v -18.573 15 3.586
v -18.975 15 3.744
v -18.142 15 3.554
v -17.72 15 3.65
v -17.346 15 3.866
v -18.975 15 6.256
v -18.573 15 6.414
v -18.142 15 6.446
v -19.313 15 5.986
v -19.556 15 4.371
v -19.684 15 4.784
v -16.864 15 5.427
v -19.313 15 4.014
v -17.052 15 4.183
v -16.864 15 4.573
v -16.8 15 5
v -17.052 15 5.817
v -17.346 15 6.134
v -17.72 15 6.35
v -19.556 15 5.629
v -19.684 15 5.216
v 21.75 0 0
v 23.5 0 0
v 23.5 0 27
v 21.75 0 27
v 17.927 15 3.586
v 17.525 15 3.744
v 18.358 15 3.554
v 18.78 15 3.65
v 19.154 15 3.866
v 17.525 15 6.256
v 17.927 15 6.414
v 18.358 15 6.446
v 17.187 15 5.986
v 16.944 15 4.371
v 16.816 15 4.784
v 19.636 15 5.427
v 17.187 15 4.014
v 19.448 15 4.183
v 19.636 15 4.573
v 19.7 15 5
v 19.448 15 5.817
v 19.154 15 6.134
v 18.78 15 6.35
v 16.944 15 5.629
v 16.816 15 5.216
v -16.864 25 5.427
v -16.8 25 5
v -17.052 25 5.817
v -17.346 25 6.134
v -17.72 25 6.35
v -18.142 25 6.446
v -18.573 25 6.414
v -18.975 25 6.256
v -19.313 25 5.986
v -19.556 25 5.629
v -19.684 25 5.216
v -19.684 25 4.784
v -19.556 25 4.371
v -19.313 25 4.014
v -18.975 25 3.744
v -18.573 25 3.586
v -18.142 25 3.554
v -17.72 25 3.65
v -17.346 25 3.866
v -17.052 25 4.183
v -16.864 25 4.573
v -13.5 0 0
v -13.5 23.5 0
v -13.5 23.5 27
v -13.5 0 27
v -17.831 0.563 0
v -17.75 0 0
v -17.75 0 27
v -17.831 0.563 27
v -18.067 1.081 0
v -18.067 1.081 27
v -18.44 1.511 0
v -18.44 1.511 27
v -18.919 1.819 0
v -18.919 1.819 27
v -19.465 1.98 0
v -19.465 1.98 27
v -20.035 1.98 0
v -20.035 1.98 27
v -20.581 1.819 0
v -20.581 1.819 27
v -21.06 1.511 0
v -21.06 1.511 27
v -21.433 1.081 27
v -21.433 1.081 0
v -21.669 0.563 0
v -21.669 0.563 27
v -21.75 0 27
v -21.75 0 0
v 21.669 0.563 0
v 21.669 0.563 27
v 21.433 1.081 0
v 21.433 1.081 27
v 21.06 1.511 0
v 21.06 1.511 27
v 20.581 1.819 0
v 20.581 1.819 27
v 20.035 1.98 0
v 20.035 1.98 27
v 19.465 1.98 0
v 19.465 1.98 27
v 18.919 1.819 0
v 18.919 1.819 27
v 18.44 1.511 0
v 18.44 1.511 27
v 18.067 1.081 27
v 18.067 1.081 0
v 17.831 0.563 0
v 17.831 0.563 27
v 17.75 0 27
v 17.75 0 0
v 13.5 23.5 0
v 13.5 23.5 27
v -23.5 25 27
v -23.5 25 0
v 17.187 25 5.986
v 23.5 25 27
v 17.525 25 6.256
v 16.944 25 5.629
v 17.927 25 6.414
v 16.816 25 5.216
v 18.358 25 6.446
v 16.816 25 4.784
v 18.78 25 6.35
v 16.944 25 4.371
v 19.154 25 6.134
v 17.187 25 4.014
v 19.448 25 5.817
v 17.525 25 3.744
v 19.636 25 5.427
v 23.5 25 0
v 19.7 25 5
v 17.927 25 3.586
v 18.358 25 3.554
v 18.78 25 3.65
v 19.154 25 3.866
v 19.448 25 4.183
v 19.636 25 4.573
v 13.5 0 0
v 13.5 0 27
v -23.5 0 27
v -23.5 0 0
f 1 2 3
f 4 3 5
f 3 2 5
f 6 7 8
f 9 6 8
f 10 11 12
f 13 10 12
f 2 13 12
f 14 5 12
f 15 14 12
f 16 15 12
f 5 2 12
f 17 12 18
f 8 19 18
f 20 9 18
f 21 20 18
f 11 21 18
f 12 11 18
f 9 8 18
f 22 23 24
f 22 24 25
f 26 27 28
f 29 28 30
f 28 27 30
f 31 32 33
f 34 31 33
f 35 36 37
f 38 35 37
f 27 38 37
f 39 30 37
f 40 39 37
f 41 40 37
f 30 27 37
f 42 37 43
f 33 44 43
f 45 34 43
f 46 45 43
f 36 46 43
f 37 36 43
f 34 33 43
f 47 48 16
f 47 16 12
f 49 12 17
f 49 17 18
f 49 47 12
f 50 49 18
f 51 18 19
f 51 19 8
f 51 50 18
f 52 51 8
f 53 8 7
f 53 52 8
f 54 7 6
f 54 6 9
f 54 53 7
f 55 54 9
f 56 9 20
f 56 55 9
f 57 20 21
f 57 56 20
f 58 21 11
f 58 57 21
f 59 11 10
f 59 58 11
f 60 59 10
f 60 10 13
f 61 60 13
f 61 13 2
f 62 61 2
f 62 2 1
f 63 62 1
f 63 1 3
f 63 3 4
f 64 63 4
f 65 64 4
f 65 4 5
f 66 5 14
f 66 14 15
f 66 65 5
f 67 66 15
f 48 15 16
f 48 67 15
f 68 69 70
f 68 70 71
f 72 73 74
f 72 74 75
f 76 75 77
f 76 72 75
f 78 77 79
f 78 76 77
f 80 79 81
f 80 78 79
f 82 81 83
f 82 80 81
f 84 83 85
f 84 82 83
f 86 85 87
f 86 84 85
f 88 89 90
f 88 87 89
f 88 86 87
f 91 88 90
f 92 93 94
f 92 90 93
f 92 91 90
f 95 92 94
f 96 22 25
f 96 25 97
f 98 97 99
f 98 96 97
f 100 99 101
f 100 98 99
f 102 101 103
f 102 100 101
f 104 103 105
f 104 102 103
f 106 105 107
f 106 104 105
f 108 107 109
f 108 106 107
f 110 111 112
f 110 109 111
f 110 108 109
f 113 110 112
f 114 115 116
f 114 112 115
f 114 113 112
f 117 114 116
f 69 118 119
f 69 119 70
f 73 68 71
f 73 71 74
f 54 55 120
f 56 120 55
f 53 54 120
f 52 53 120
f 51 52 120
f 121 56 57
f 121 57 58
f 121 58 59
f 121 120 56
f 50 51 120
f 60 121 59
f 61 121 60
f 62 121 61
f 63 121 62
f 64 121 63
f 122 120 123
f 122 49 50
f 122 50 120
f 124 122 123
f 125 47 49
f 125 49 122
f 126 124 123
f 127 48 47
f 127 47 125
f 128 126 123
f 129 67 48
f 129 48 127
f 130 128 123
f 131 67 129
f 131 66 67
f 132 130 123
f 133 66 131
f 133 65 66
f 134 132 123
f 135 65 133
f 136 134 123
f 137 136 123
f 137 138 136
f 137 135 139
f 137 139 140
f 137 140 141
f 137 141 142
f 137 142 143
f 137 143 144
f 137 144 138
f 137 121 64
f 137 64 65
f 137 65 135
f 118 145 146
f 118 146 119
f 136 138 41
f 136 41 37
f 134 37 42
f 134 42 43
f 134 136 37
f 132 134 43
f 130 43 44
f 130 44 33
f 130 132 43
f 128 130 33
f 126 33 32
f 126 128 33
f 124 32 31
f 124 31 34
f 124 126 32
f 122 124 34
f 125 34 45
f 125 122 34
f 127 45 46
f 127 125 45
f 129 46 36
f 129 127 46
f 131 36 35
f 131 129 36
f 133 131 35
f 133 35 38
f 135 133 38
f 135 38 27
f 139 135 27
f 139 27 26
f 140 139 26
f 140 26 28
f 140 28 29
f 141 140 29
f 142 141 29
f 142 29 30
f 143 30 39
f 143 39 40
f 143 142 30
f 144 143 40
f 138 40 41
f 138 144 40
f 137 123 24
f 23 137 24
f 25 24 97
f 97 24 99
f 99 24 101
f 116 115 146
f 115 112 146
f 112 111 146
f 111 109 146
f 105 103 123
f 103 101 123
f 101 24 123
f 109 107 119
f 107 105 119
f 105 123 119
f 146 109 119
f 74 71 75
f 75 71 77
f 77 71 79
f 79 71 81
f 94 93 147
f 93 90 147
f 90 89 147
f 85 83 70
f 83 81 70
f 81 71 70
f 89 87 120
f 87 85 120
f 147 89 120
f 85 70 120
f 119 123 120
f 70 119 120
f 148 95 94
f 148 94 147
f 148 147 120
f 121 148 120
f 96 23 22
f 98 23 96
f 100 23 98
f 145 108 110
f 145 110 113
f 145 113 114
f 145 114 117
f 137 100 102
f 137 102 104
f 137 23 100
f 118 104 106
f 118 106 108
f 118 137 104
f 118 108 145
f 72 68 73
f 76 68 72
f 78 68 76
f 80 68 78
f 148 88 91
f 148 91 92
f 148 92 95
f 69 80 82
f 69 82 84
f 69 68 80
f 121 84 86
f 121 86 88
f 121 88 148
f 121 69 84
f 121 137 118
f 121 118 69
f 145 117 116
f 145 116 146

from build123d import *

# Parameters (mm, degrees)
PAD_DEPTH       = 27
SKETCH001_R     = 2
POCKET_DEPTH    = 27.001
SKETCH002_R     = 1.45
POCKET001_DEPTH = 10


with BuildPart() as part:
    # Sketch → Pad (new body)
    with BuildSketch(Plane.XY):
        Polygon((13.5, 0), (13.5, 23.5), (-13.5, 23.5), (-13.5, 0), (-23.5, 0), (-23.5, 25), (23.5, 25), (23.5, 0), align=None)
    extrude(amount=PAD_DEPTH)

    # Sketch001 → Pocket (cut, through all)
    with BuildSketch(Plane.XY):
        with Locations((-19.75, 0)):
            Circle(SKETCH001_R)
        with Locations((19.75, 0)):
            Circle(SKETCH001_R)
    extrude(amount=POCKET_DEPTH, mode=Mode.SUBTRACT)

    # Sketch002 (on DatumPlane) → Pocket001 (cut)
    with BuildSketch(Plane.XZ.offset(-25)):
        with Locations((-18.25, 5)):
            Circle(SKETCH002_R)
        with Locations((18.25, 5)):
            Circle(SKETCH002_R)
    extrude(amount=POCKET001_DEPTH, mode=Mode.SUBTRACT)


solid = part.part
